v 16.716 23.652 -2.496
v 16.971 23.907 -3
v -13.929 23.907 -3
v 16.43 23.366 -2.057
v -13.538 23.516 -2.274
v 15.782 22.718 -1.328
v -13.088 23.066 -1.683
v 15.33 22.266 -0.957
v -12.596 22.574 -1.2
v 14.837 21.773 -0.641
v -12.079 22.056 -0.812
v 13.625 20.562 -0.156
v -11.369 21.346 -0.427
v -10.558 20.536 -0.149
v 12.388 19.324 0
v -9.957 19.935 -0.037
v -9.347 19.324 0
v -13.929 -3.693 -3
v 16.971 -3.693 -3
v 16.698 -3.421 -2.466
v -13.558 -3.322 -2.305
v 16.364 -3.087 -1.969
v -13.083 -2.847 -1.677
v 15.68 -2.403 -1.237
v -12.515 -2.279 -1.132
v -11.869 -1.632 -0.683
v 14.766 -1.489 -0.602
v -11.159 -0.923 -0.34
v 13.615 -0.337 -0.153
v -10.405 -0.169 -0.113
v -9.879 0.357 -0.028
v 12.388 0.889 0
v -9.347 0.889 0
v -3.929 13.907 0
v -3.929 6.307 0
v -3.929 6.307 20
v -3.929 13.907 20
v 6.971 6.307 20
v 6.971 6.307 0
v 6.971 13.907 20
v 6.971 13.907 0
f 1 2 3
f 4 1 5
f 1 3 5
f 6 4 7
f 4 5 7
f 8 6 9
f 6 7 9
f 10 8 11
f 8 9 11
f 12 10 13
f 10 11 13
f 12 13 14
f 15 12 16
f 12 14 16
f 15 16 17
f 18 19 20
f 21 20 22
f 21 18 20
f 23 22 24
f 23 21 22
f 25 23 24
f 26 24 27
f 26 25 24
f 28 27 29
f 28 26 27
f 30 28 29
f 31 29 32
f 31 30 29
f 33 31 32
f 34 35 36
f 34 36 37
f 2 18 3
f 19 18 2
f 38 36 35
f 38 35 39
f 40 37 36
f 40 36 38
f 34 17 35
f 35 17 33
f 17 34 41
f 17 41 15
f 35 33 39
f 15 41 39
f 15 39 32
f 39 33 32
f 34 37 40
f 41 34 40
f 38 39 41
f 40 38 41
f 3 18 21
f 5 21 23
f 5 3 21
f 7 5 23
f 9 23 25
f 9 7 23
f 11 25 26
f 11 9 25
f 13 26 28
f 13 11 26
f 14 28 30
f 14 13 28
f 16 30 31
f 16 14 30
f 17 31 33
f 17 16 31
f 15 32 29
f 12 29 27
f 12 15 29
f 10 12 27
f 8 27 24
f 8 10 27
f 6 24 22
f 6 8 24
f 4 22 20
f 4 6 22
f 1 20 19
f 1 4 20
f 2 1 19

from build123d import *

# Parameters (mm, degrees)
F0_W        = 10.9
F0_H        = 7.6
F1_DEPTH    = 20
F2_W        = 30.9
F2_H        = 27.6
F2_W_2      = 10.9
F2_H_2      = 7.6
F3_DEPTH    = 3
F4_T1_DEPTH = 50.5128784748
F4_T3_DEPTH = 53.8128784748


# Not quite as in the source:
# - a fillet or chamfer that OpenCascade refuses, or shapes differently, is made with other operations: its cross-section is extruded or revolved along the edge and cut away or added


with BuildPart() as f1:
    # F0 (on Top) → F1 (new body)
    with BuildSketch(Plane.XY):
        with Locations((1.5206737995, 10.1067991287)):
            Rectangle(F0_W, F0_H)
    extrude(amount=F1_DEPTH)

    # F2 (on face) → F3 (join)
    with BuildSketch(Plane(origin=(0, 0, 0), x_dir=(1, 0, 0), z_dir=(0, 0, -1))):
        with Locations((1.5206737995, -10.1067991287)):
            Rectangle(F2_W, F2_H)
        with Locations((1.5206737995, -10.1067991287)):
            Rectangle(F2_W_2, F2_H_2, mode=Mode.SUBTRACT)
        with Locations((1.5206737995, -10.1067991287)):
            Rectangle(F2_W_2, F2_H_2)
    extrude(amount=F3_DEPTH)

    # F4: fillet of radius 5 on 4 edges, made by hand

    # F4_s2 → F4_t1 (cut)
    with BuildSketch(Plane.XZ.offset(-35.363238366)):
        with BuildLine():
            ThreePointArc((-13.9293262005, -3), (-12.0853632931, -0.8166998673), (-9.3467505055, 0))
            Line((-9.3467505055, 0), (-13.9293262005, 0))
            Line((-13.9293262005, 0), (-13.9293262005, -3))
        make_face()
        with BuildLine():
            ThreePointArc((12.3880981046, 0), (15.1267108921, -0.8166998673), (16.9706737995, -3))
            Line((16.9706737995, -3), (16.9706737995, 0))
            Line((16.9706737995, 0), (12.3880981046, 0))
        make_face()
    extrude(amount=F4_T1_DEPTH, mode=Mode.SUBTRACT)

    # F4_s4 → F4_t3 (cut)
    with BuildSketch(Plane.YZ.offset(-25.3857654379)):
        with BuildLine():
            ThreePointArc((-3.6932008713, -3), (-1.8492379639, -0.8166998673), (0.8893748236, 0))
            Line((0.8893748236, 0), (-3.6932008713, 0))
            Line((-3.6932008713, 0), (-3.6932008713, -3))
        make_face()
        with BuildLine():
            ThreePointArc((23.9067991287, -3), (22.0628362212, -0.8166998673), (19.3242234337, 0))
            Line((19.3242234337, 0), (23.9067991287, 0))
            Line((23.9067991287, 0), (23.9067991287, -3))
        make_face()
    extrude(amount=F4_T3_DEPTH, mode=Mode.SUBTRACT)


solid = f1.part
